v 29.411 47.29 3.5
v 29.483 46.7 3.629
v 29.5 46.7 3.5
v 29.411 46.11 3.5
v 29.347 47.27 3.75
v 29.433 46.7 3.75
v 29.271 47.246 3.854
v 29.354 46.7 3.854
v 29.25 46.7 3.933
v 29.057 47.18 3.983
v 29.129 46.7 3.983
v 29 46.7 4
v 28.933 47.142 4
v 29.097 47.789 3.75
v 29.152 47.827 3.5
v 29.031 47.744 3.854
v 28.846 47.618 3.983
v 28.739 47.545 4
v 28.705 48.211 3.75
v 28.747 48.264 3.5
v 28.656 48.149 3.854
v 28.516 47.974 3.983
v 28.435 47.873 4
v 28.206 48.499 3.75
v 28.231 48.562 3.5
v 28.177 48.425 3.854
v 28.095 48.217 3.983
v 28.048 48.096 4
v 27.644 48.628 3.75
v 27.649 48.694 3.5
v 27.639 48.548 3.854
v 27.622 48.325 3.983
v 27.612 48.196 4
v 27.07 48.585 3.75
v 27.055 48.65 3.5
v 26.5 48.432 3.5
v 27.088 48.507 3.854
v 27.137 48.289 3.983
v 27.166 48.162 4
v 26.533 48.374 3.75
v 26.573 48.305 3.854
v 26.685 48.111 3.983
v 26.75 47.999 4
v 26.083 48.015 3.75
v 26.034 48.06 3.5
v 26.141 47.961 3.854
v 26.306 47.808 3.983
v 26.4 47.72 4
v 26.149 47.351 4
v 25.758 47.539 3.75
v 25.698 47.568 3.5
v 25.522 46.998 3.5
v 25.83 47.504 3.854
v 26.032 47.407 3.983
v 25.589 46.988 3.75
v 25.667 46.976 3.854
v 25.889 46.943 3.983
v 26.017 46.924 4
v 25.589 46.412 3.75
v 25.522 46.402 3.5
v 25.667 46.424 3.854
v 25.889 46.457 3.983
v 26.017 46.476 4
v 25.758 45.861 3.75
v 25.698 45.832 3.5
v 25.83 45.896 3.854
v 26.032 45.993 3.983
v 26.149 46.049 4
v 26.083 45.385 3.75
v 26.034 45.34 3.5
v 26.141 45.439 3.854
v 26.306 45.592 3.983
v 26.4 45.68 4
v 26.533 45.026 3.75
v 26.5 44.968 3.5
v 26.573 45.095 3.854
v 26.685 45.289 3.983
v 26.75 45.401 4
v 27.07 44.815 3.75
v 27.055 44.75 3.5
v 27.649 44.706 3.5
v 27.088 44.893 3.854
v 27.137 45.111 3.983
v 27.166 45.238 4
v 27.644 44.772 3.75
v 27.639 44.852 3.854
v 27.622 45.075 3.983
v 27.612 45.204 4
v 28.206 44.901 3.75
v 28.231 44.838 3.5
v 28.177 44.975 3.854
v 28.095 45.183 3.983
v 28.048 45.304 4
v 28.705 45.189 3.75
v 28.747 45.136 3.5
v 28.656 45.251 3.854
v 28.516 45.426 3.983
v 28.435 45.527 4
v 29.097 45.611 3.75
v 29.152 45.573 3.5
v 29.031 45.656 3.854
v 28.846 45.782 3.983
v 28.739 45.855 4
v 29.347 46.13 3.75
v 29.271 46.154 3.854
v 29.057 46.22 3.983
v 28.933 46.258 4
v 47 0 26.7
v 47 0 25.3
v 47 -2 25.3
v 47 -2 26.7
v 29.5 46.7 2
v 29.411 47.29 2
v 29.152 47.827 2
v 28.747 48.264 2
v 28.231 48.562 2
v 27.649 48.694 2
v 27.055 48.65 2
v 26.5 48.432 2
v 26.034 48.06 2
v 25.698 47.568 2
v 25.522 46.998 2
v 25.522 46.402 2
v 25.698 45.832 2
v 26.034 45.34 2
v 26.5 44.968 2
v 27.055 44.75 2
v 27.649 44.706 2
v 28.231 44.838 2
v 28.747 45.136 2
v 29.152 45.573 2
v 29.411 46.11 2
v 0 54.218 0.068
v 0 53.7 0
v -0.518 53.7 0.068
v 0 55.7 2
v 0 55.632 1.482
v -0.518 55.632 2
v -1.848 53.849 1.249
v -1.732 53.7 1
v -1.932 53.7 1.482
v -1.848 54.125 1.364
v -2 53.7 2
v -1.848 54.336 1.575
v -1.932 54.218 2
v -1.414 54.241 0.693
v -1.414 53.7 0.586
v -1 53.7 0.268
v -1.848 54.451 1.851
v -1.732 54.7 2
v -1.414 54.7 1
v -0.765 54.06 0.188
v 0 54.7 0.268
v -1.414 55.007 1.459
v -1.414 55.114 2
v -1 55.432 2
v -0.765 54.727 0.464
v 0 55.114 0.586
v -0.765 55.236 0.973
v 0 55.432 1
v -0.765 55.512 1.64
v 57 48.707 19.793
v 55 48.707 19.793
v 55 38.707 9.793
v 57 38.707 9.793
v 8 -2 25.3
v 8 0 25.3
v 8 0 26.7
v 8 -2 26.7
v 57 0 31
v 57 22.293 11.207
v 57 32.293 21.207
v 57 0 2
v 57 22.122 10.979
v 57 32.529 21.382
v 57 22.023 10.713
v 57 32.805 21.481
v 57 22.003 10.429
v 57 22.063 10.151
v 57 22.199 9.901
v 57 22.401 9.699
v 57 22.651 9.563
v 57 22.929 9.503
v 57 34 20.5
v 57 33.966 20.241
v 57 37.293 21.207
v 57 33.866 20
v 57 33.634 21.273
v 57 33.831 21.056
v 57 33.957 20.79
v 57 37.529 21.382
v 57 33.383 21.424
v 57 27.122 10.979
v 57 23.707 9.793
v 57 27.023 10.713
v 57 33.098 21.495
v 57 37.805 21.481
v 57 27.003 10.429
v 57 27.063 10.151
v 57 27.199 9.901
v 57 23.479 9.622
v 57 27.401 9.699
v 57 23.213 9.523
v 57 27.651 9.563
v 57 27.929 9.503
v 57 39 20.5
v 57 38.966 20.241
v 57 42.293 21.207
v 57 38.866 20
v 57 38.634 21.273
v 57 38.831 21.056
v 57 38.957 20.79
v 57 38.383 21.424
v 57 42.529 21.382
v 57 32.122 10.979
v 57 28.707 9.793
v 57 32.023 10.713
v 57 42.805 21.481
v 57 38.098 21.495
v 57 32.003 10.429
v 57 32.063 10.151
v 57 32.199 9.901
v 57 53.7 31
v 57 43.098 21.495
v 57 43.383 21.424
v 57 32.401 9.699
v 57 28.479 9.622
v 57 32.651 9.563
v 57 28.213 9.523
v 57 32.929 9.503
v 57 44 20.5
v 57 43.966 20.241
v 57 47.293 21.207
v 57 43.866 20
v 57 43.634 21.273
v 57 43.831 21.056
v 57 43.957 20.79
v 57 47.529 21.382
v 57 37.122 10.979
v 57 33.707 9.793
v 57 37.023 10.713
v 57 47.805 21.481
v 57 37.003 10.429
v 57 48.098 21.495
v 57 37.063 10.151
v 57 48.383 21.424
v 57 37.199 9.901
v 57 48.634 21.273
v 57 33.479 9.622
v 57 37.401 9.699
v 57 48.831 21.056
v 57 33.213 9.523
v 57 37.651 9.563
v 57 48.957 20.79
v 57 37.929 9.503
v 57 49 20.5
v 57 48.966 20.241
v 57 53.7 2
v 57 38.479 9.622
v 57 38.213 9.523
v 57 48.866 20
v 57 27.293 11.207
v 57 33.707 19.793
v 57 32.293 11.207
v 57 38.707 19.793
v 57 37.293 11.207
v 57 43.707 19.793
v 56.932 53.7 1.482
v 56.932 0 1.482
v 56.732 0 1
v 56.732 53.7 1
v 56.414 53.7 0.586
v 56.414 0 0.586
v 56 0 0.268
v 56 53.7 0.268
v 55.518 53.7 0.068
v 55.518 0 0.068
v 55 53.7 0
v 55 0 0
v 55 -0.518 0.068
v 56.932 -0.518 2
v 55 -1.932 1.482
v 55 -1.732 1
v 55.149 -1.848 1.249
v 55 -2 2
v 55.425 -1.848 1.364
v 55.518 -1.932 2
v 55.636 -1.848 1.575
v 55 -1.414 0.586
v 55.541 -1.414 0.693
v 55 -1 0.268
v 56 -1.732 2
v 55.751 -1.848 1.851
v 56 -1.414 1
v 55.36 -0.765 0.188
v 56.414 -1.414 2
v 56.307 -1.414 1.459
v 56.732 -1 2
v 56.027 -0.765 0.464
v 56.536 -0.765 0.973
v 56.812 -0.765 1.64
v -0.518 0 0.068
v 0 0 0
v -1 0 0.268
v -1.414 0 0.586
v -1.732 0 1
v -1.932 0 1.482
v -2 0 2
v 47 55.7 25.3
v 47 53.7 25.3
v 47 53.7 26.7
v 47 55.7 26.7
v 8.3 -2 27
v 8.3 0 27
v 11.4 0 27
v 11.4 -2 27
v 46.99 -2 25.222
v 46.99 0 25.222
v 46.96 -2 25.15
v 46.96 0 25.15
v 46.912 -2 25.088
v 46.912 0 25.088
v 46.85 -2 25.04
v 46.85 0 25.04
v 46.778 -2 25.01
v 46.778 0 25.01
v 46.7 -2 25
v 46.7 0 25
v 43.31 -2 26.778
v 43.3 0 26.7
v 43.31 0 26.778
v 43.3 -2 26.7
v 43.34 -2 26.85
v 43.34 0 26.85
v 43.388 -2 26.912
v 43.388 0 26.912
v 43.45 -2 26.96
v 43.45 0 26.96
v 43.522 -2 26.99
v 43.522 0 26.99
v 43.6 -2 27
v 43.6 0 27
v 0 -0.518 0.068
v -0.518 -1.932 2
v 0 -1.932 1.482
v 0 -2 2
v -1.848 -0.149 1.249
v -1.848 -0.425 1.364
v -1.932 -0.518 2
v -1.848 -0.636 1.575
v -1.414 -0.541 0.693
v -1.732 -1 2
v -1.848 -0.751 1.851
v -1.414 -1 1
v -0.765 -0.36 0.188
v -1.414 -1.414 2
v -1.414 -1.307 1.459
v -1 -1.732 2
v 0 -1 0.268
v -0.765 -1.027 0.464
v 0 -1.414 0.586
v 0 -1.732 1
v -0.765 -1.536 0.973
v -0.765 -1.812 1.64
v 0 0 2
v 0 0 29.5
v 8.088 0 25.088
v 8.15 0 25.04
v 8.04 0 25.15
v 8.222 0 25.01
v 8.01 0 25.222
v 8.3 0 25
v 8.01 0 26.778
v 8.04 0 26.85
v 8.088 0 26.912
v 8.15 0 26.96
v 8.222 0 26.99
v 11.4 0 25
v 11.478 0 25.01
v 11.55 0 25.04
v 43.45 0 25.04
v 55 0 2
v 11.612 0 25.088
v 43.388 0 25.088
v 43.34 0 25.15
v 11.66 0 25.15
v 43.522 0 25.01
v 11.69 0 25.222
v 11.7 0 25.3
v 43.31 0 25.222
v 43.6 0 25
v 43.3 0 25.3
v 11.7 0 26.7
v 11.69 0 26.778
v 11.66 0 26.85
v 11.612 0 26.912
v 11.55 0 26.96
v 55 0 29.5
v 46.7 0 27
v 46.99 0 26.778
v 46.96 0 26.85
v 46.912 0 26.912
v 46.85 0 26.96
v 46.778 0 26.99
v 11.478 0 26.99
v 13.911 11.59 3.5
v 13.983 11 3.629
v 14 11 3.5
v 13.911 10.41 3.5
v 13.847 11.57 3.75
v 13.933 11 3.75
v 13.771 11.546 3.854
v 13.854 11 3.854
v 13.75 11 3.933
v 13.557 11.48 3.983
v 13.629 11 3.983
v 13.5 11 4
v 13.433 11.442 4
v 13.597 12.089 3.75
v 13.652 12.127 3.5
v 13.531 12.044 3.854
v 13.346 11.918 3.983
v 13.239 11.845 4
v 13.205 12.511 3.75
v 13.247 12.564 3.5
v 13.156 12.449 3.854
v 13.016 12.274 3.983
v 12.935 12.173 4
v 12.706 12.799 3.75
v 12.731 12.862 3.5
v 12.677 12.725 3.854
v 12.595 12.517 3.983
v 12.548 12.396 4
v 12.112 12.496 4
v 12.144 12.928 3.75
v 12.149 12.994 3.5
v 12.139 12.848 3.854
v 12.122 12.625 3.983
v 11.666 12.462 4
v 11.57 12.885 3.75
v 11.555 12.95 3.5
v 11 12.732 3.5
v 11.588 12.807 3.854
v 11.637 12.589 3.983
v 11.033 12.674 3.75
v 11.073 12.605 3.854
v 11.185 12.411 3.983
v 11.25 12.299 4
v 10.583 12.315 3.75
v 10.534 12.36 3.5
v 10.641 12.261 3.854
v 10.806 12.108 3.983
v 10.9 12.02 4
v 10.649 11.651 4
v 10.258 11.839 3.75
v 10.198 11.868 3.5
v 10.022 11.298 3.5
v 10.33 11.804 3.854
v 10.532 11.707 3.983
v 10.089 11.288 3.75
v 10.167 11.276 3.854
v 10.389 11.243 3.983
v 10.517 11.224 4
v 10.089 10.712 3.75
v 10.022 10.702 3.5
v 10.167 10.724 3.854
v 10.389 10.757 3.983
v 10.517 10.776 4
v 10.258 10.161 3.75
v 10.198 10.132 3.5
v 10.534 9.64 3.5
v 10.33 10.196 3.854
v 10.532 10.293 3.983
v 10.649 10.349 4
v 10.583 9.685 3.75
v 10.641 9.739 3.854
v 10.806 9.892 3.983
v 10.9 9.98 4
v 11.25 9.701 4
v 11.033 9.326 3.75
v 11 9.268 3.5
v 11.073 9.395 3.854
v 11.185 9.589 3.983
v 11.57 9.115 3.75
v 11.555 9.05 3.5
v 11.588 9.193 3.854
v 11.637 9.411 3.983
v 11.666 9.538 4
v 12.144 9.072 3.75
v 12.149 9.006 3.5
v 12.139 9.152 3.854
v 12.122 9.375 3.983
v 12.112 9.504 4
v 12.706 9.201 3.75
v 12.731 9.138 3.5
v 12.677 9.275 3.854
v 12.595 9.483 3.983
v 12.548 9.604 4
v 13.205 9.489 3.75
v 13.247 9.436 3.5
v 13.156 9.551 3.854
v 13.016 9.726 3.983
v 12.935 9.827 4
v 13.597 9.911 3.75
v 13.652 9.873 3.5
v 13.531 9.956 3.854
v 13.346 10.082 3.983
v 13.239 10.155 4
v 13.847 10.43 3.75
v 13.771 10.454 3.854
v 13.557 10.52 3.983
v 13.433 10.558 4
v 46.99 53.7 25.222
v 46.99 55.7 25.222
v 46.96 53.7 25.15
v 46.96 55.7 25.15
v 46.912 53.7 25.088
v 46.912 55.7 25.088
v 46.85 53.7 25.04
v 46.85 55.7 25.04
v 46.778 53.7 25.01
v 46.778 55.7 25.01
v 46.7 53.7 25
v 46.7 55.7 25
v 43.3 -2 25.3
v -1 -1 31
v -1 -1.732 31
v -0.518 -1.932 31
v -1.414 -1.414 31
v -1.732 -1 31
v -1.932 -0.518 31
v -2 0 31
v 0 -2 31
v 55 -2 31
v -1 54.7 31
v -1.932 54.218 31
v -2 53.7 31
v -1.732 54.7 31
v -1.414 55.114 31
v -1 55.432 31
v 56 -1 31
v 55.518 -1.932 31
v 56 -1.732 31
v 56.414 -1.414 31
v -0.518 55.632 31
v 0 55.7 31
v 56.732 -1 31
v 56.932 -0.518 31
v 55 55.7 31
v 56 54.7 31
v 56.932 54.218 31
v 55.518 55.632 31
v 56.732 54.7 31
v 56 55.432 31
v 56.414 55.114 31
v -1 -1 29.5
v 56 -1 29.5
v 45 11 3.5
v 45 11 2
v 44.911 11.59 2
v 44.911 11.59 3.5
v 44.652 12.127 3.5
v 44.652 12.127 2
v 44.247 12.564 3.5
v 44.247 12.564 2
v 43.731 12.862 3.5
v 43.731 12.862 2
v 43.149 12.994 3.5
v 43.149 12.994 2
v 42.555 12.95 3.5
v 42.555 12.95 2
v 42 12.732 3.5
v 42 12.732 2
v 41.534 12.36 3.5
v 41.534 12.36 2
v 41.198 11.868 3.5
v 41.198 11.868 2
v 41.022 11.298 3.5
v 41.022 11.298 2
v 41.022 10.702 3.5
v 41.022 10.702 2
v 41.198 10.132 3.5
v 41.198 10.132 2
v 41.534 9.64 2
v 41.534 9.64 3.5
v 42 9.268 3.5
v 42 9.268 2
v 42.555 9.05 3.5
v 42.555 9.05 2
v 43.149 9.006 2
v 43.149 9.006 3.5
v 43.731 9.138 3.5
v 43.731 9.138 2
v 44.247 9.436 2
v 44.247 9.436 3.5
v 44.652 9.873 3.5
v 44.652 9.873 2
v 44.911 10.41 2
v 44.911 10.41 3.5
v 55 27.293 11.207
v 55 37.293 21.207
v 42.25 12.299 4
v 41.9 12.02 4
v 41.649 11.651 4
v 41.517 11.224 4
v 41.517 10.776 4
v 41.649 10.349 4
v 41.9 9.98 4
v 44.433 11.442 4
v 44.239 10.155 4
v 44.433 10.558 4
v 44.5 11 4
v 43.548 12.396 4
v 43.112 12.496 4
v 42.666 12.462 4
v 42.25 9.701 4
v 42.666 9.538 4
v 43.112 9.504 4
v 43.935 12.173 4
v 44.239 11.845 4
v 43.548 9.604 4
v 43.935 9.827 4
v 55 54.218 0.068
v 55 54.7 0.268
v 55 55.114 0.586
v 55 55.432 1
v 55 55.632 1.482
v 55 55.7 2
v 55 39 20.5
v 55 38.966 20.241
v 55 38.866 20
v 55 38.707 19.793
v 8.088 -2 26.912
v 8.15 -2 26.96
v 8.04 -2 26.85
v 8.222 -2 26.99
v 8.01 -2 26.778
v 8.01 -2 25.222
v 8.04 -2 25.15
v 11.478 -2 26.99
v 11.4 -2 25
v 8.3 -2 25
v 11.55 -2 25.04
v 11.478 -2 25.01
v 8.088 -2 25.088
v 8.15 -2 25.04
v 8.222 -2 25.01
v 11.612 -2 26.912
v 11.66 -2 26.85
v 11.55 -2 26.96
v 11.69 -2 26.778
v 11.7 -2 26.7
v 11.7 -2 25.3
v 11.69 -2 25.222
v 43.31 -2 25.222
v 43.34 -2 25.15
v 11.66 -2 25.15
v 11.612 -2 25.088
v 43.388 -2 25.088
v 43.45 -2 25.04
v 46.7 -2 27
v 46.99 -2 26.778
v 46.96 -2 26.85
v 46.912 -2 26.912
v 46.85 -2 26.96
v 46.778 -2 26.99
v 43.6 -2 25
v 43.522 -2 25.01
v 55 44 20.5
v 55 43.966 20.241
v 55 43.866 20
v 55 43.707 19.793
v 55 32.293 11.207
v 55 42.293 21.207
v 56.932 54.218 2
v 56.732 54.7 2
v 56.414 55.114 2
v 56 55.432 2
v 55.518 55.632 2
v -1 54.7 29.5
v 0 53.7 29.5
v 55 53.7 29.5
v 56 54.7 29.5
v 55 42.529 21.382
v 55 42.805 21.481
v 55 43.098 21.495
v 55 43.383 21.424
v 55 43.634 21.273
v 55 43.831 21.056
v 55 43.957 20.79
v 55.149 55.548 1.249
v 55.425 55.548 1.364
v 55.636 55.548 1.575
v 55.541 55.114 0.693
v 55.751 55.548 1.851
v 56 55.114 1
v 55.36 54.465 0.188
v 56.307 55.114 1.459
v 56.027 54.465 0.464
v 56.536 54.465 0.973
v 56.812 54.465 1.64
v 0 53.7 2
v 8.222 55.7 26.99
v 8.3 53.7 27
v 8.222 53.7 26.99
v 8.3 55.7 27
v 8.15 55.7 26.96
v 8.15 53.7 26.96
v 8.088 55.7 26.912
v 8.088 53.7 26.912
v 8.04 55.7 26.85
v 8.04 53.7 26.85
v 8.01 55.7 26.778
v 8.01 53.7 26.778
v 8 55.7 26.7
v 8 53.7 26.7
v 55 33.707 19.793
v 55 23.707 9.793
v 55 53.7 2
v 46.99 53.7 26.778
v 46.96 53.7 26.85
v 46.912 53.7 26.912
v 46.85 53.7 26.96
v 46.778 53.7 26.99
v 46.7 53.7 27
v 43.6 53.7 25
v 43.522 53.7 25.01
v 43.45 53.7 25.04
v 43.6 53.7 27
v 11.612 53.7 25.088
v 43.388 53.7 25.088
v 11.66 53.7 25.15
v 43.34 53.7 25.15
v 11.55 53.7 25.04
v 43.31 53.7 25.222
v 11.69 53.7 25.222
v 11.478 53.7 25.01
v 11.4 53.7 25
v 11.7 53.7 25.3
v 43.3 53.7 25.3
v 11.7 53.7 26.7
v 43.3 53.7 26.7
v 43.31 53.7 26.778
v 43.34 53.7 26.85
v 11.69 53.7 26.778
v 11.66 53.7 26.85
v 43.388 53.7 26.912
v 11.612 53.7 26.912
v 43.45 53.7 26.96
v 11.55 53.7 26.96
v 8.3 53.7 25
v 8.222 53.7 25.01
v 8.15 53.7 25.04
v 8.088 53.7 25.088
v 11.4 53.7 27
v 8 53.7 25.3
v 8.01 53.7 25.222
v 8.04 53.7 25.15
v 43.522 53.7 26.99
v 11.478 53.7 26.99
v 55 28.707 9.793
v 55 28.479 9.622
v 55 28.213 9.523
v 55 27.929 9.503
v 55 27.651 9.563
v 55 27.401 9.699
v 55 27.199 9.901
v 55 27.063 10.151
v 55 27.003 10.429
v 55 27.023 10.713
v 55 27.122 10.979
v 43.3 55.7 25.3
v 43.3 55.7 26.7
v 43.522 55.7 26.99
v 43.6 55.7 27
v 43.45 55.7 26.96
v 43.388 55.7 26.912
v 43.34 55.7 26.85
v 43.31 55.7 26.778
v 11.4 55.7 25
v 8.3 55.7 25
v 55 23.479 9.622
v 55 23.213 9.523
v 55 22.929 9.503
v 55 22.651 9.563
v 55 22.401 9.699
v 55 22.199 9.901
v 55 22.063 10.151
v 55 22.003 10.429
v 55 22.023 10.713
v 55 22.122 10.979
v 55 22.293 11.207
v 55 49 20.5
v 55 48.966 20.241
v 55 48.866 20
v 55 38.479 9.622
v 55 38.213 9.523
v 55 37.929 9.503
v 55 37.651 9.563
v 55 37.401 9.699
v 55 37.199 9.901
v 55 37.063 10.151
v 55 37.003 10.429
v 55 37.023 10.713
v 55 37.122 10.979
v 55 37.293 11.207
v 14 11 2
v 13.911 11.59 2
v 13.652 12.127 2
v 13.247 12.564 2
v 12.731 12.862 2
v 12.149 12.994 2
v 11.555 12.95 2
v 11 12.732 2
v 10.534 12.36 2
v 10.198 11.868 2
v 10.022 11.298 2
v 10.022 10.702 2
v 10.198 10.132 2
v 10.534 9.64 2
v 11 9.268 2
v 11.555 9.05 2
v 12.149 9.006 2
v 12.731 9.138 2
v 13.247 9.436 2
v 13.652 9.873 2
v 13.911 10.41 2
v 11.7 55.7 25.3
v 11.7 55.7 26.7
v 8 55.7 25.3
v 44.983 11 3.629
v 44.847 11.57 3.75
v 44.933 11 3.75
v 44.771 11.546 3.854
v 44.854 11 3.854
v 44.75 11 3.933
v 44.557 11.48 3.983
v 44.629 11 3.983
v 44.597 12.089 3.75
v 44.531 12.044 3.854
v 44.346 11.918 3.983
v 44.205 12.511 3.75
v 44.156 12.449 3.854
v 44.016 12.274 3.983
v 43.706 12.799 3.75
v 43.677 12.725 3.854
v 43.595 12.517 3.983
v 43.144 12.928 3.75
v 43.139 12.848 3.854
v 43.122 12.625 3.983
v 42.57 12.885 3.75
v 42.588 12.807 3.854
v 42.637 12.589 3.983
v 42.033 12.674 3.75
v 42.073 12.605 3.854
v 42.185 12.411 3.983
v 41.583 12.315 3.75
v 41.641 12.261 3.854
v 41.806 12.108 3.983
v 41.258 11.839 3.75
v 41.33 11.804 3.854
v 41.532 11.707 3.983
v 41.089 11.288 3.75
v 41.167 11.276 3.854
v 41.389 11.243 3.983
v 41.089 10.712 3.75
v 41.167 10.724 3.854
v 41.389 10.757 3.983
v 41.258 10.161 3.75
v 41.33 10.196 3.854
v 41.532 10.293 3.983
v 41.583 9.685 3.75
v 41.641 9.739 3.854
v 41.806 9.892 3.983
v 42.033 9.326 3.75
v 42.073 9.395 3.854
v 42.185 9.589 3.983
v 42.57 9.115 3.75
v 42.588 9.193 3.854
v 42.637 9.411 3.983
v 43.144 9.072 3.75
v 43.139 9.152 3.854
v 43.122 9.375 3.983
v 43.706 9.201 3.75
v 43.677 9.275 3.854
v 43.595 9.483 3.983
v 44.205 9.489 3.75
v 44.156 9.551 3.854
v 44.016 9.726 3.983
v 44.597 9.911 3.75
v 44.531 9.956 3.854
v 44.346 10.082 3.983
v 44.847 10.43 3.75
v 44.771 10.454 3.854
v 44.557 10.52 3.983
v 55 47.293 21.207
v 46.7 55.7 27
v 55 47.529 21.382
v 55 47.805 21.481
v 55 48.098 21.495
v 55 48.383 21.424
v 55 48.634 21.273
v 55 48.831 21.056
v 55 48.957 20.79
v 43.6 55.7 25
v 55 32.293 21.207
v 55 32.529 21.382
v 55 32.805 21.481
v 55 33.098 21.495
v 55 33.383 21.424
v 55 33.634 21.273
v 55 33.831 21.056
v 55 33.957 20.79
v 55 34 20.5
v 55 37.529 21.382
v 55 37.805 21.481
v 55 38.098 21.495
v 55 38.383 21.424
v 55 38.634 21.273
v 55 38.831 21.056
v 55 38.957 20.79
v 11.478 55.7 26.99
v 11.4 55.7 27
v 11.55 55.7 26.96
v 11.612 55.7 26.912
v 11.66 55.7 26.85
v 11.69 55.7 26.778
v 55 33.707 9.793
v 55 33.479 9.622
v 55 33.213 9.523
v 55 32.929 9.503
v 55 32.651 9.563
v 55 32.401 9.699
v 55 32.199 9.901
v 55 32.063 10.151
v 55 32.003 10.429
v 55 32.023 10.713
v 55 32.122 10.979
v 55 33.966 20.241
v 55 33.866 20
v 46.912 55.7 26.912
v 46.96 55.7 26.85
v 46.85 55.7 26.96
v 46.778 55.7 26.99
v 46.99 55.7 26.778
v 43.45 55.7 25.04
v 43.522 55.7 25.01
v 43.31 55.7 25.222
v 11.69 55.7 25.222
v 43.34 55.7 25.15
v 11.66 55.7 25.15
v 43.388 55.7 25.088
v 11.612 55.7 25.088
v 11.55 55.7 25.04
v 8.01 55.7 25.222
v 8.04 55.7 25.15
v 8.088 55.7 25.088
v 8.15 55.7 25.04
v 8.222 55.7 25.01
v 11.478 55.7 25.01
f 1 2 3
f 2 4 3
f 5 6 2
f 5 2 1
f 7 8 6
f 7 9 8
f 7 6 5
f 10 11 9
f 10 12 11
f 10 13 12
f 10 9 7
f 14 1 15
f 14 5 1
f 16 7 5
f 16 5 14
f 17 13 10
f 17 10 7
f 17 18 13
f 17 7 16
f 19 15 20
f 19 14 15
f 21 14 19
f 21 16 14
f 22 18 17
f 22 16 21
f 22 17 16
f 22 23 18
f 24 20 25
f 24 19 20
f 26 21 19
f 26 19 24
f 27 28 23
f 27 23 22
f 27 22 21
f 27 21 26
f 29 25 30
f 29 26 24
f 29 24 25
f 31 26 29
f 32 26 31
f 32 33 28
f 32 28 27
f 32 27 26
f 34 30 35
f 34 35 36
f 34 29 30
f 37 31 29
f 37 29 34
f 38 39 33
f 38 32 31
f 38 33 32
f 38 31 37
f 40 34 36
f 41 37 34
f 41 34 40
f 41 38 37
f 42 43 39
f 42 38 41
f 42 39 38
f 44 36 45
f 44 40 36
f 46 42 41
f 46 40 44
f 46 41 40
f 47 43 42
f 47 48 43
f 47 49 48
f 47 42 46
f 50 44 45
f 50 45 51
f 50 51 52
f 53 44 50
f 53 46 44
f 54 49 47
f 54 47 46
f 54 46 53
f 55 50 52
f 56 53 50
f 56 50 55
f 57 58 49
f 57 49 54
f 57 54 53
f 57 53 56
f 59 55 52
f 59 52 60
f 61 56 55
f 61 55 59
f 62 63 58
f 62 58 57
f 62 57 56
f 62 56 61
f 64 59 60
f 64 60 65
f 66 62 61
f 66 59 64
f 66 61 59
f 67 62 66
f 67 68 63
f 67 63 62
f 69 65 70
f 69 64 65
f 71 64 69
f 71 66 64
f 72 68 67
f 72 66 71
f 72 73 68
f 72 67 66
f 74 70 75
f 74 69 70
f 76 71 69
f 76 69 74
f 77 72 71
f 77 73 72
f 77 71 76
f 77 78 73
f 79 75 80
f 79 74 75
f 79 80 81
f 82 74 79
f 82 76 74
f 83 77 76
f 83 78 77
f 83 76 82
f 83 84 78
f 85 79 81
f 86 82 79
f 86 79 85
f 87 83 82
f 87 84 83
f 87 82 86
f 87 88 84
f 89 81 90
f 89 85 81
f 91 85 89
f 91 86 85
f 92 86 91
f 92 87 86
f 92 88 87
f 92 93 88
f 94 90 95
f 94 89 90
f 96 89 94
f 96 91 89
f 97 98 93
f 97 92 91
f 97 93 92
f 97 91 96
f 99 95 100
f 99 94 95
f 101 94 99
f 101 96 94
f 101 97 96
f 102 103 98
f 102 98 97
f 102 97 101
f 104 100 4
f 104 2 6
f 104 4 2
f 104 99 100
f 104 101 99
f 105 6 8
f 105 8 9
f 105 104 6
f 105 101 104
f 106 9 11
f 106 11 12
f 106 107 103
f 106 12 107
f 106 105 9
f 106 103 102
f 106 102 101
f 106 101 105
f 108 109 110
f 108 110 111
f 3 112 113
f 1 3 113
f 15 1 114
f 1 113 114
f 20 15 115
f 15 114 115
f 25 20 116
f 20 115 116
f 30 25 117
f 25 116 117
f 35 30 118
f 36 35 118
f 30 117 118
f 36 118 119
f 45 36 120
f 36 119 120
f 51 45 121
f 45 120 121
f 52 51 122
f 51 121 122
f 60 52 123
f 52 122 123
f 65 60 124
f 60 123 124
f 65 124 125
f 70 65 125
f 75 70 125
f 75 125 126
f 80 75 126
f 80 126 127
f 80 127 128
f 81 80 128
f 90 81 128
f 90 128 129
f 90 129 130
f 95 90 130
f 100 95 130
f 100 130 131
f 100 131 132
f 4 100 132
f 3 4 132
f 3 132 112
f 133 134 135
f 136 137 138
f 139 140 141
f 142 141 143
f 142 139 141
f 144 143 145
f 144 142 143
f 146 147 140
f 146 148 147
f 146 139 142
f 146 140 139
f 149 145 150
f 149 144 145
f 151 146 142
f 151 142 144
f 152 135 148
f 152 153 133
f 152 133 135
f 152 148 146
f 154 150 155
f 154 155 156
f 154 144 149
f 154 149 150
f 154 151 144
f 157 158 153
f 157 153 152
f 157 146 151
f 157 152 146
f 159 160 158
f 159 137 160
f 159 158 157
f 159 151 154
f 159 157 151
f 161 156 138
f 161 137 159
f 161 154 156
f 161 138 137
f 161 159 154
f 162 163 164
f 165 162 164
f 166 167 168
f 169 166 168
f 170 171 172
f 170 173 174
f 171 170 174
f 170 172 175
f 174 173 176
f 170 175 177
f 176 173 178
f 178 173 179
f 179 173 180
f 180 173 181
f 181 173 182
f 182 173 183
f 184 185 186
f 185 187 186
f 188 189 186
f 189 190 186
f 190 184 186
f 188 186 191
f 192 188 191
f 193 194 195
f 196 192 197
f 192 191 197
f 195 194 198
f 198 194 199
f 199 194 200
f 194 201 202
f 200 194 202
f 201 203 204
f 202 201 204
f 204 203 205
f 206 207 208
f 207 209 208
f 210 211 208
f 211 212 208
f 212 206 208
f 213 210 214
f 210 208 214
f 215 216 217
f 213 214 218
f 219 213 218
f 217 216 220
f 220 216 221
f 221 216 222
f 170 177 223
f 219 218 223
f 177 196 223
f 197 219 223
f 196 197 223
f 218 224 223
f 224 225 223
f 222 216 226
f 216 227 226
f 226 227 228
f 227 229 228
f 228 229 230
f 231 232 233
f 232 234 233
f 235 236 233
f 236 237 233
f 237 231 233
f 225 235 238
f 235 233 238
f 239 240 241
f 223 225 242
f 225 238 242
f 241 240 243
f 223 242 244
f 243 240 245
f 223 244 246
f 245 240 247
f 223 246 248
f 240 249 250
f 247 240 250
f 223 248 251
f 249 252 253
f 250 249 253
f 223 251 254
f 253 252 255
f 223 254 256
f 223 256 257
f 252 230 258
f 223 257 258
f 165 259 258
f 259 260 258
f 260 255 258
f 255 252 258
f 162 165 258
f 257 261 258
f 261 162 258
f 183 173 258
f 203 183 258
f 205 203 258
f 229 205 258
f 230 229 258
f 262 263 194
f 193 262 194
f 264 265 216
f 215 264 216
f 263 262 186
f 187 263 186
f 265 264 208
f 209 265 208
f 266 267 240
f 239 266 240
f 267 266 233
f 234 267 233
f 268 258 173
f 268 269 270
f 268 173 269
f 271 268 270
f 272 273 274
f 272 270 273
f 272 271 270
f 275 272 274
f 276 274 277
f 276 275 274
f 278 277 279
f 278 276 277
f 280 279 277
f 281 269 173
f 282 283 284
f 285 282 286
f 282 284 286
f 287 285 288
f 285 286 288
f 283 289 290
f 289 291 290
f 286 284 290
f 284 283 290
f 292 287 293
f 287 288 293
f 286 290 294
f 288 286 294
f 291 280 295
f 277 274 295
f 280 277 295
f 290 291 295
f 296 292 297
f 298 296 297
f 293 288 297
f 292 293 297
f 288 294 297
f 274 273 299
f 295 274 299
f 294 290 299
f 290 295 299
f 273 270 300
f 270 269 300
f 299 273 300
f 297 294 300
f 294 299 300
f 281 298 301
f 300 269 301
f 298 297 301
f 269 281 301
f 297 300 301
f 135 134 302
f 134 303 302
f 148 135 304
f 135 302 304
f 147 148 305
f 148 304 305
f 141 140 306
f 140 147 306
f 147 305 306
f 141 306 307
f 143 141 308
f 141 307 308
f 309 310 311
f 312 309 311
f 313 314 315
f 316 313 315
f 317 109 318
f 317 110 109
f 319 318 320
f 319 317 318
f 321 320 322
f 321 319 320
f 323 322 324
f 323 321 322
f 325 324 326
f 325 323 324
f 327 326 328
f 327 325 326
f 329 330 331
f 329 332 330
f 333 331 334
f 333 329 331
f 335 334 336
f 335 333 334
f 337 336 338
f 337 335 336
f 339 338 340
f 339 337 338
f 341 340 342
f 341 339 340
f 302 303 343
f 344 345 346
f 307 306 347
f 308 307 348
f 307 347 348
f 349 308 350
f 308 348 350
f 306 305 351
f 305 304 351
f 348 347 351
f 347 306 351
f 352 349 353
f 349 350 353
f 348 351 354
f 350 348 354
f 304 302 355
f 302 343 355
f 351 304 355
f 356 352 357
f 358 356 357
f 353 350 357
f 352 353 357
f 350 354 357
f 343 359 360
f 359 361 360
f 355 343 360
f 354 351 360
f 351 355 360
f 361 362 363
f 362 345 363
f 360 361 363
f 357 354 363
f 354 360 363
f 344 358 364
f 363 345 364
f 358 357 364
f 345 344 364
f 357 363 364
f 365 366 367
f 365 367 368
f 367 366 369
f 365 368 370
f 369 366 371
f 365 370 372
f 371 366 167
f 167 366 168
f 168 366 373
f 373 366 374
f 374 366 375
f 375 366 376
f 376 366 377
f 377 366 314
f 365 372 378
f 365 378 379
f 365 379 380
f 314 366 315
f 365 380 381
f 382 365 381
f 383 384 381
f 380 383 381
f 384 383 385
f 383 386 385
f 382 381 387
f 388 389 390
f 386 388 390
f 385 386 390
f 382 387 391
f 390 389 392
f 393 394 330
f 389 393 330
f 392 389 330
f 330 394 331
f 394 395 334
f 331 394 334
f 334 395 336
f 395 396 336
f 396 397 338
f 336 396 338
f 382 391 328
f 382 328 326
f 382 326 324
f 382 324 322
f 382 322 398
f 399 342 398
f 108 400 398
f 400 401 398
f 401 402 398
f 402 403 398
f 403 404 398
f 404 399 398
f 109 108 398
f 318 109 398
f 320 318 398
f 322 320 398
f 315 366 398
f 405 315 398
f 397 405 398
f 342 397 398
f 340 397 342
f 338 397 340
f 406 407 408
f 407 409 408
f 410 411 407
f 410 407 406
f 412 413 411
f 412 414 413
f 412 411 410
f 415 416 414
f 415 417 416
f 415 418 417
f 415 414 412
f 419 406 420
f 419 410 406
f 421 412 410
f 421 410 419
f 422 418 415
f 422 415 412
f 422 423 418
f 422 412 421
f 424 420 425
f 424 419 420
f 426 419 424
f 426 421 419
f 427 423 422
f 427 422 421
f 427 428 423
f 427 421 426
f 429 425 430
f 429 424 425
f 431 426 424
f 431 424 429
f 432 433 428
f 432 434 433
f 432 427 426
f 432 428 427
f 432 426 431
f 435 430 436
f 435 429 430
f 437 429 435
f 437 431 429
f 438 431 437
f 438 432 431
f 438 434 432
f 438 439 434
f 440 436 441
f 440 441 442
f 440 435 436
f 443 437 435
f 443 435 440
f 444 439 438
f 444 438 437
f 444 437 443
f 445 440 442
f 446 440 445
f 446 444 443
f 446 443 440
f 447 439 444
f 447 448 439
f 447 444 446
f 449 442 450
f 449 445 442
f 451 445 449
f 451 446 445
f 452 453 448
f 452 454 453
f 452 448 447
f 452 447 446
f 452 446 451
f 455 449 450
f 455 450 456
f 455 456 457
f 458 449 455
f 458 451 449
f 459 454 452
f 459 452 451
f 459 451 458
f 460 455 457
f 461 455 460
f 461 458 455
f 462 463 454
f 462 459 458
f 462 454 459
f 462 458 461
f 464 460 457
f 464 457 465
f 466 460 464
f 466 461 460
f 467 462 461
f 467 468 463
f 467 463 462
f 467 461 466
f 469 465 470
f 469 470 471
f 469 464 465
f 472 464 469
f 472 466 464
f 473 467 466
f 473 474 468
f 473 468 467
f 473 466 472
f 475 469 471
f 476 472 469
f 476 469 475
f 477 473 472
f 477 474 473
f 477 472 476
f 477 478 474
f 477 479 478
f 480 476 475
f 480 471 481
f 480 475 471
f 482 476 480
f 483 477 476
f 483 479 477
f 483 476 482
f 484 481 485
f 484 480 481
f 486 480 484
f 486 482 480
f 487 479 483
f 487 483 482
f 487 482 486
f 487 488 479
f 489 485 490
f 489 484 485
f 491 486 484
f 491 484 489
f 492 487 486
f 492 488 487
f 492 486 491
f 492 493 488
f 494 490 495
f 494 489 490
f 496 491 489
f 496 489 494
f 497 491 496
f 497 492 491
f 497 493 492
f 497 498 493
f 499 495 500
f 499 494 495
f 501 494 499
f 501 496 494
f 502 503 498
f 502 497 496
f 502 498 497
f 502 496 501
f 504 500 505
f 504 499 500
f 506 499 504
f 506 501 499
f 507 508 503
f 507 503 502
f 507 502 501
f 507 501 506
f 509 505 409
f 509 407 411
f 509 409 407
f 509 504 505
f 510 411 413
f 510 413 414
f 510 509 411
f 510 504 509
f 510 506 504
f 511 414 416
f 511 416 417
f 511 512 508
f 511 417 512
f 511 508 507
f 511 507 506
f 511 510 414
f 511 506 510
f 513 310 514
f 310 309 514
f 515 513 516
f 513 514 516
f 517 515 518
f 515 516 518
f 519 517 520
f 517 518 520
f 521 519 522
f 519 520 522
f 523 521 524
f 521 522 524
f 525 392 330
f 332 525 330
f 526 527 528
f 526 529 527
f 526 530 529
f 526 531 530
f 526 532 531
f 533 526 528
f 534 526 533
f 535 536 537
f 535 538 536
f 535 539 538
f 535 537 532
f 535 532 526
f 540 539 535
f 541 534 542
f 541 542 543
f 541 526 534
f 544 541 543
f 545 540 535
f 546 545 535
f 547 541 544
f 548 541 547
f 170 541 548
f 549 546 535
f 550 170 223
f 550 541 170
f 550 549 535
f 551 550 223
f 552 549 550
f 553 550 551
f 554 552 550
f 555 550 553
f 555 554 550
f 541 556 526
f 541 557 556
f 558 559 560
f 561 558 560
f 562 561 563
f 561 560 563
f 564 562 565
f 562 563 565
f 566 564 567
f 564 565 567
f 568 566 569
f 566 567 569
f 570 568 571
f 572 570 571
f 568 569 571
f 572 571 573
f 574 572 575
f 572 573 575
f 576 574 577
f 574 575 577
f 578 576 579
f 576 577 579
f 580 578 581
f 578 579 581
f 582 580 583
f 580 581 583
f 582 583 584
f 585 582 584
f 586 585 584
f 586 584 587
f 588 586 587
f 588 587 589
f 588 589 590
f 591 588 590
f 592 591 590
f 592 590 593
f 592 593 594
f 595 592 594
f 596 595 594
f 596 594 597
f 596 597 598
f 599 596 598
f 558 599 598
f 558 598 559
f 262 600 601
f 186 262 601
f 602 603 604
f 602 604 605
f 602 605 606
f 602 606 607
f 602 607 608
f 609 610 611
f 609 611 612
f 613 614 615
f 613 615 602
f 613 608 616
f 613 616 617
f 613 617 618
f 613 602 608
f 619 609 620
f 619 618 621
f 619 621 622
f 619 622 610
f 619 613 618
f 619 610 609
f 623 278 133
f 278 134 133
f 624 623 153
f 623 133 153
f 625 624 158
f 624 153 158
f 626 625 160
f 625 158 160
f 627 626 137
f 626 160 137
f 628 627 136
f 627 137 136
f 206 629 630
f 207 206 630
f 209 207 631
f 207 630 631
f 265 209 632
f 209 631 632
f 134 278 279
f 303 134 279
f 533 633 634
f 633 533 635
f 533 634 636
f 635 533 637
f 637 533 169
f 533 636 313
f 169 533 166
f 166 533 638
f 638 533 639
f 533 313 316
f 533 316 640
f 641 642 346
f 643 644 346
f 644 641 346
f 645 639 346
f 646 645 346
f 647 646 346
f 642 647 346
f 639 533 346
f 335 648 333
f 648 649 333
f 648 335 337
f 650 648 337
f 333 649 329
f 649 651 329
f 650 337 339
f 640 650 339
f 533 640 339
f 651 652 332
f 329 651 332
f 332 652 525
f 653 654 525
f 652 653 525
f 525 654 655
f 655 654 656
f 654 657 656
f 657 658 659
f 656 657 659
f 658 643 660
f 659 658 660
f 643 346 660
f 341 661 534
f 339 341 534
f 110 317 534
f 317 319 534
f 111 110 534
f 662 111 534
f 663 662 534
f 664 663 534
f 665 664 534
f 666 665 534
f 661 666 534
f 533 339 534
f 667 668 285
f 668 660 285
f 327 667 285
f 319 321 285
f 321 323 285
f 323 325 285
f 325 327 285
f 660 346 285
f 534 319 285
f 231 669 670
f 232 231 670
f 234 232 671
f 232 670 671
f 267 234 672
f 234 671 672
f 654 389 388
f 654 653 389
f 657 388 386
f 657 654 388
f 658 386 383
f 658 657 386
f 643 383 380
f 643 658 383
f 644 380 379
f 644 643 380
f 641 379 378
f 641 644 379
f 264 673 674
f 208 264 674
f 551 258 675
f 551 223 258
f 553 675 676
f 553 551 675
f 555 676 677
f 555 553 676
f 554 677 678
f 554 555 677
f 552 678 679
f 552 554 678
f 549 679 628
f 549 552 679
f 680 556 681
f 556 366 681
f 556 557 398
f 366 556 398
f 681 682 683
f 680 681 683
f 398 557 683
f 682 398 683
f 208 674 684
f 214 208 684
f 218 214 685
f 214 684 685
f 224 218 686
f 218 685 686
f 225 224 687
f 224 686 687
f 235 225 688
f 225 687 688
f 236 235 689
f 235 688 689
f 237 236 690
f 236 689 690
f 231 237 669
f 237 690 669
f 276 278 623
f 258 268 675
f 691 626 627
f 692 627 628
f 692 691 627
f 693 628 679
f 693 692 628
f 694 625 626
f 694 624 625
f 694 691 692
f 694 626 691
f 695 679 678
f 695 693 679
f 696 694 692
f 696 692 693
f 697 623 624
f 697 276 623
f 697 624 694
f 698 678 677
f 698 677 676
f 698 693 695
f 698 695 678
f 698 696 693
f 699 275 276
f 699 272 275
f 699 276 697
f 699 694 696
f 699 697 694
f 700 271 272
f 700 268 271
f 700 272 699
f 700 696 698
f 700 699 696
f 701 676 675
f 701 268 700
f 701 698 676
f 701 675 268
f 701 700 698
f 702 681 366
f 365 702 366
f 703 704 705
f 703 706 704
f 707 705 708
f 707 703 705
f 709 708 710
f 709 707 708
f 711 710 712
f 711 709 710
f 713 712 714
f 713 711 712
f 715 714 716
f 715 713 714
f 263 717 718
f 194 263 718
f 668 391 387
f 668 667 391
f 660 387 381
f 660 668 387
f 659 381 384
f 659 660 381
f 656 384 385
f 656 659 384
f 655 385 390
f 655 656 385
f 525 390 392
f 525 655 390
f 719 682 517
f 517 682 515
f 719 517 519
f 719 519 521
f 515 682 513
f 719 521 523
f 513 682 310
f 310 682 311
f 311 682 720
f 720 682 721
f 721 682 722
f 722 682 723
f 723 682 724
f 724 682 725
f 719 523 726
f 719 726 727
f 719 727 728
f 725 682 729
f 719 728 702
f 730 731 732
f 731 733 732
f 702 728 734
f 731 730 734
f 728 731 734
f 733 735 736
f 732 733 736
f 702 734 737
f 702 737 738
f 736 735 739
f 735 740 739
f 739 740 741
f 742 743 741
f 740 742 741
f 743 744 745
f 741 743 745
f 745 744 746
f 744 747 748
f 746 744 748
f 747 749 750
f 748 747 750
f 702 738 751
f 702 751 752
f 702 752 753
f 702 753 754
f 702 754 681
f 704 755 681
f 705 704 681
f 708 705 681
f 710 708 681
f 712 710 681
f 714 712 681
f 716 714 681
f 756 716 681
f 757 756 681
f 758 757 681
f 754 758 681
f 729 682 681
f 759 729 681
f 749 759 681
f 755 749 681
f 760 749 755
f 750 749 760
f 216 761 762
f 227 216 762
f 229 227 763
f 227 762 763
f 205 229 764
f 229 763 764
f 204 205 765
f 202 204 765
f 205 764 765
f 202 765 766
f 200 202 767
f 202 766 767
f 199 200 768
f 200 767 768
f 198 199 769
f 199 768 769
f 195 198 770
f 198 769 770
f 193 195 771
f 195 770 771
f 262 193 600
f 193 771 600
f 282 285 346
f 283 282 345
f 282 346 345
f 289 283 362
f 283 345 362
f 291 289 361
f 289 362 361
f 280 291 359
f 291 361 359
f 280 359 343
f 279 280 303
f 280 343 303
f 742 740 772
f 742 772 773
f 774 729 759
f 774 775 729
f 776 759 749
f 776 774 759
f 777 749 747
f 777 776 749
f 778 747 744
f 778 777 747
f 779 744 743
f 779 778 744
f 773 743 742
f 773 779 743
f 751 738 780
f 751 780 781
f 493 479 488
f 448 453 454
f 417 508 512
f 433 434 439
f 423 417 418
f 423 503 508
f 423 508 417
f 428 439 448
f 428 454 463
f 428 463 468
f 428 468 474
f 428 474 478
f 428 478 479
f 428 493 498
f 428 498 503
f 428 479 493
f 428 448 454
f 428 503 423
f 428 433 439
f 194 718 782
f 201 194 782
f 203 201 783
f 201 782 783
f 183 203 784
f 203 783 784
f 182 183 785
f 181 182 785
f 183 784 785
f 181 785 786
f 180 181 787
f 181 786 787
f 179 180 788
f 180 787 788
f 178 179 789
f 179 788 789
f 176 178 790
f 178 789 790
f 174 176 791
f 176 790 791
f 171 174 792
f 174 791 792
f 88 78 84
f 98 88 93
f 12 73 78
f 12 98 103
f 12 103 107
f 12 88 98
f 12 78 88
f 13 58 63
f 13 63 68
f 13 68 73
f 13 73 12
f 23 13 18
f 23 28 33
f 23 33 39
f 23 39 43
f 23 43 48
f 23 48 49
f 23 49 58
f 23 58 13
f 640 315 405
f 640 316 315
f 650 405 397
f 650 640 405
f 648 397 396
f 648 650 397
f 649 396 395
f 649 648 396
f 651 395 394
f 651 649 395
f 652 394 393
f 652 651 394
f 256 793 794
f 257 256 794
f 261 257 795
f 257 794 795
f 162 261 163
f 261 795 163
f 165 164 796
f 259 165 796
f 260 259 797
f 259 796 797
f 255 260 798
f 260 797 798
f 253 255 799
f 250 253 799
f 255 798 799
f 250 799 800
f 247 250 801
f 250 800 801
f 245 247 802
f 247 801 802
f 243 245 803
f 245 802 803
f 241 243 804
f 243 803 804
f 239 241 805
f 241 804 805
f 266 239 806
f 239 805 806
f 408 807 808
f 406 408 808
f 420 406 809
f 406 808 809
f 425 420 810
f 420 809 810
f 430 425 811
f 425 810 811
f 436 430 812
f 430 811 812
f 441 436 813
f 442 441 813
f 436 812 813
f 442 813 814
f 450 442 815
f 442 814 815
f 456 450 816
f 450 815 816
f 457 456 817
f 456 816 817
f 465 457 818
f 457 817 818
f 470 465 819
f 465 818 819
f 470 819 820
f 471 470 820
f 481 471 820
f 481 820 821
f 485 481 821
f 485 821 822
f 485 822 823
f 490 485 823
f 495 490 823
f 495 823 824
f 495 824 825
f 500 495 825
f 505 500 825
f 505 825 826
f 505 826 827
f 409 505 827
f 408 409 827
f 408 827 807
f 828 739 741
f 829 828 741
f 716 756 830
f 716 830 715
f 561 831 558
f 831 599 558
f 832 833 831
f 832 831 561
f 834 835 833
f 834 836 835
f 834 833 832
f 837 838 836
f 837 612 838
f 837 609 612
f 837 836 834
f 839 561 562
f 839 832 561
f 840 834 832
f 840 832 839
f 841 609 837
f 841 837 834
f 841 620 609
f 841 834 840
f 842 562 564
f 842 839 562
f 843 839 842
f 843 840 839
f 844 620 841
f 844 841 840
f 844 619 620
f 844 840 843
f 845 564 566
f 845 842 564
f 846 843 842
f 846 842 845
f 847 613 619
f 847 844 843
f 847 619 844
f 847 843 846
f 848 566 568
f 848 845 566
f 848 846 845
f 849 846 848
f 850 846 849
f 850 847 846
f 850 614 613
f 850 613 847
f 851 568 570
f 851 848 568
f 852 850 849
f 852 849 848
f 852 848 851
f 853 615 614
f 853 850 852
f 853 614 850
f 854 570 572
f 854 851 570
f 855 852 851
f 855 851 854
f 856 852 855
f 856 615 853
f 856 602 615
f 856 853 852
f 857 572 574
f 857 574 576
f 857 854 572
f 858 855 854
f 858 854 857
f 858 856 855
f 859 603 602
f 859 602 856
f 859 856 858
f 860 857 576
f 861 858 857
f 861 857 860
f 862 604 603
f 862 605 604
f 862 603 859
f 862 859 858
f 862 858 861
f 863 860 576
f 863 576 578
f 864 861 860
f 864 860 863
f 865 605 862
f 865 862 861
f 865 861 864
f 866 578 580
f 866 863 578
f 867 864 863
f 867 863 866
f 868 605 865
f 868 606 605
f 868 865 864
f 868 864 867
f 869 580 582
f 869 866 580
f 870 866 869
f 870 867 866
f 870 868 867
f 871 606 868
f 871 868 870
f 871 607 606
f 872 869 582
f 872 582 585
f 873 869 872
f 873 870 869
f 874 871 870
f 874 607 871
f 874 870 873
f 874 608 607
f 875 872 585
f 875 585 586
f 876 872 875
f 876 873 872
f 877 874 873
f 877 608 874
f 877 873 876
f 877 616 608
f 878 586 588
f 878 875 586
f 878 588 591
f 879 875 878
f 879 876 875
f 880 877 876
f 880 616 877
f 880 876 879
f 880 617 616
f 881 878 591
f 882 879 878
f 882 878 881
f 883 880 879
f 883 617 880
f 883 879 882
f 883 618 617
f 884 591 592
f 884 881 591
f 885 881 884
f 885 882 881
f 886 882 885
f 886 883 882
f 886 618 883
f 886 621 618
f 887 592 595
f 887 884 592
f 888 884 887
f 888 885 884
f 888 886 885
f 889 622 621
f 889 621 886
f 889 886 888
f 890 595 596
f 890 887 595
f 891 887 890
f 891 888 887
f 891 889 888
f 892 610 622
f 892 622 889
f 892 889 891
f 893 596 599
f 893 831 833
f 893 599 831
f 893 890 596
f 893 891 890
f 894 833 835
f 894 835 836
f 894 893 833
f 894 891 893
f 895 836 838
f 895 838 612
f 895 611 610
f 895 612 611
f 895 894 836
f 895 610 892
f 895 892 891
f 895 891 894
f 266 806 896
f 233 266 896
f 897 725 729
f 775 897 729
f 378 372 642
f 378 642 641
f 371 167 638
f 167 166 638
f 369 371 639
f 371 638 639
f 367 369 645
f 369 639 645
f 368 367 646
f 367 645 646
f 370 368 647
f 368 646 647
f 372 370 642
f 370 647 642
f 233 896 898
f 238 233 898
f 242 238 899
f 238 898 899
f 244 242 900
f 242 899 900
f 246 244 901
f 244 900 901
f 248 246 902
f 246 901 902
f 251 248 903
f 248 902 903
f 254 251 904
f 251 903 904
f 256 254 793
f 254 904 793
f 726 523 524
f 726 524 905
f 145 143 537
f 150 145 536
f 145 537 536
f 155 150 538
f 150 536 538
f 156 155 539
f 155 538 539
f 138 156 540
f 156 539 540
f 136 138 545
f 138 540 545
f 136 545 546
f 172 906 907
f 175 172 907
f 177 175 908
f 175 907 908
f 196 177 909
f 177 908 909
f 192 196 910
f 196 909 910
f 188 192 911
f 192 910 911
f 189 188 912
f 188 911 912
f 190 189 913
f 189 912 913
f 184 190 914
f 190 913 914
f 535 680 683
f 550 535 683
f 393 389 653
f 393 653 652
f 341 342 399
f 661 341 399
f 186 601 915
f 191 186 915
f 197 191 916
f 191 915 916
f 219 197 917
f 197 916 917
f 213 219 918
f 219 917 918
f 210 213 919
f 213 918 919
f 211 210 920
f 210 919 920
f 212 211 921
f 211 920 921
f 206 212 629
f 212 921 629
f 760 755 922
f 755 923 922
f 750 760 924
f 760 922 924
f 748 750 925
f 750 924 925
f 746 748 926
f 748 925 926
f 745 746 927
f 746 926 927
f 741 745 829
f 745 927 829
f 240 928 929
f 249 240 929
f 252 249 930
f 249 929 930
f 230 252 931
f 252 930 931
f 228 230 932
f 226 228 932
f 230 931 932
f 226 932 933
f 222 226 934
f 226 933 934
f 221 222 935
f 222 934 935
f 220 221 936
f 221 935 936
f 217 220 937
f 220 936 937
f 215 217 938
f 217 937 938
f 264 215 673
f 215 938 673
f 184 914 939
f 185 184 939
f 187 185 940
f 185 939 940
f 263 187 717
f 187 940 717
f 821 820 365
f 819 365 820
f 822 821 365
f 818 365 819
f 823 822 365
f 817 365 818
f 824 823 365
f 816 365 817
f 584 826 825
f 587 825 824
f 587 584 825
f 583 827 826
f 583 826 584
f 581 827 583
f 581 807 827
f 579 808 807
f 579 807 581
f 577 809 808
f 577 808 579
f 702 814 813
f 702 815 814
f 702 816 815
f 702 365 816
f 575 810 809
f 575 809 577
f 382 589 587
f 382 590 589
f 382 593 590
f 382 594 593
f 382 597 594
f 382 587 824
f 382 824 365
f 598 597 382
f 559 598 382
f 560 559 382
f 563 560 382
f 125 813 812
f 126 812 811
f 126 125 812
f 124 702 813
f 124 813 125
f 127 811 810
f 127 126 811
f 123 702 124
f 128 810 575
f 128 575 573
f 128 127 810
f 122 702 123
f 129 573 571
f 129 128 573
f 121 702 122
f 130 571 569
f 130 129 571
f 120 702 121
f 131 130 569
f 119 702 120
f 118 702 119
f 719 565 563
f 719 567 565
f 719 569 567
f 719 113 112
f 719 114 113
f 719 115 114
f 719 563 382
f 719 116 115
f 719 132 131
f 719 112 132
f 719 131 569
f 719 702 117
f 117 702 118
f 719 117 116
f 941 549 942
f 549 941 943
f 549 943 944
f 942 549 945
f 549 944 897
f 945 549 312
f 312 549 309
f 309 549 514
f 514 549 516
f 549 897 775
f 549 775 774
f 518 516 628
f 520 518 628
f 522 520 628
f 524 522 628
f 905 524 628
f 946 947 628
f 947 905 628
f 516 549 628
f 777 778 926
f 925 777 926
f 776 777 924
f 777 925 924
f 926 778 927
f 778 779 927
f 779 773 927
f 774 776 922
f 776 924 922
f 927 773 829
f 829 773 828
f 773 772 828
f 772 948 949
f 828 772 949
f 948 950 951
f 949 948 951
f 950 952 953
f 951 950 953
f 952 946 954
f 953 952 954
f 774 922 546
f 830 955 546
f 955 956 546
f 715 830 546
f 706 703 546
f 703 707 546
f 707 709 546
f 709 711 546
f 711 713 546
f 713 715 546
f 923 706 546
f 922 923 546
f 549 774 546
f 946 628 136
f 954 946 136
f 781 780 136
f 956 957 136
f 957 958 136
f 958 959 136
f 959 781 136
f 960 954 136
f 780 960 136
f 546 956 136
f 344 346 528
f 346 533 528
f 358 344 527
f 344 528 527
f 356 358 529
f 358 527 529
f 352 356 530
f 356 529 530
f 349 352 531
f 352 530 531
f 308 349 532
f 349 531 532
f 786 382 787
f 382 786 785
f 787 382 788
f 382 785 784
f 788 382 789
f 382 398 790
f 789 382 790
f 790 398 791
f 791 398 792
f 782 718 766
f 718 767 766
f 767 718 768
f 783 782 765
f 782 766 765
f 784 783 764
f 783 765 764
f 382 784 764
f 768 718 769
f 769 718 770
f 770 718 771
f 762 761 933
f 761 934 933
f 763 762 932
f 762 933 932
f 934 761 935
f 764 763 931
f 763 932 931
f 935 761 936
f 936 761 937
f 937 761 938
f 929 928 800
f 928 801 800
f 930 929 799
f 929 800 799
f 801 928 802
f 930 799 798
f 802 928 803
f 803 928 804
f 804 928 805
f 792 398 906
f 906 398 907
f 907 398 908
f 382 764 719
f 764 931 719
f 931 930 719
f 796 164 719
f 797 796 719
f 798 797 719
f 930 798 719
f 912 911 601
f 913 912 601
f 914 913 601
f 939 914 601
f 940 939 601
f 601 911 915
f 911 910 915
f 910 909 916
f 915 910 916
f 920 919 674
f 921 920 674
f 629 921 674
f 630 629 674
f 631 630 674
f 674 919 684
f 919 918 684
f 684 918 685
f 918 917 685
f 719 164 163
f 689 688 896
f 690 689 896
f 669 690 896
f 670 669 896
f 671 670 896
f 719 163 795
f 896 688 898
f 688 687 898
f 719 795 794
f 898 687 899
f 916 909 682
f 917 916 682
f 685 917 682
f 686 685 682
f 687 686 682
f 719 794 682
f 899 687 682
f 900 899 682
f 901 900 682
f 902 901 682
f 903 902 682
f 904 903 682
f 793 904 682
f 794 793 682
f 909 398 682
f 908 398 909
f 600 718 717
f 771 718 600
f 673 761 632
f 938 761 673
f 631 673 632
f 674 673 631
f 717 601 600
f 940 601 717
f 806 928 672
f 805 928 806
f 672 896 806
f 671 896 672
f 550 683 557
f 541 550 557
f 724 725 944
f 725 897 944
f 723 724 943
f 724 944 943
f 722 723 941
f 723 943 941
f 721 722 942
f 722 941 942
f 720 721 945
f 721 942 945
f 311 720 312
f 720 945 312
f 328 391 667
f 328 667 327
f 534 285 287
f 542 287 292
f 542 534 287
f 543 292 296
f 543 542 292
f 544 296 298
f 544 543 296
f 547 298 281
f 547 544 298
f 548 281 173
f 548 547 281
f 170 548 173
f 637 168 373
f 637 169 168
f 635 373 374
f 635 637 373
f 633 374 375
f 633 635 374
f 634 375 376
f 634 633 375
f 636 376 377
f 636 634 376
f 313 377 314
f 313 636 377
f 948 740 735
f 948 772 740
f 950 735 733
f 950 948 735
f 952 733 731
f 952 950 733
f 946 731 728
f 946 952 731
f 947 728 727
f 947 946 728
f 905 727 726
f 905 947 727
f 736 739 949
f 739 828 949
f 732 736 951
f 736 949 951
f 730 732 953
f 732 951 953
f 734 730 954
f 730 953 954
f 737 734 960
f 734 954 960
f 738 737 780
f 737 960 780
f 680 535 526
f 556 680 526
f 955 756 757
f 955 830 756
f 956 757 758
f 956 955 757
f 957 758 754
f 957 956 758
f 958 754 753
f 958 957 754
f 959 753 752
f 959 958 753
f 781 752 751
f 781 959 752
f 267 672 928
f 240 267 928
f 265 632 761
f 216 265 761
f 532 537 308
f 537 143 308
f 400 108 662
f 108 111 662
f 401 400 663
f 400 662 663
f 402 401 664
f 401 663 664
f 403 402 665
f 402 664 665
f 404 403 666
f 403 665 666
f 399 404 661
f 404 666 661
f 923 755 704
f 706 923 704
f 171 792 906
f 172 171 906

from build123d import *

# Parameters (mm, degrees)
F0_W      = 55
F0_H      = 53.7
F0_R      = 2
F1_DEPTH  = 2
F2_DEPTH  = 4
F3_W      = 55
F3_H      = 27.5
F3_W_2    = 3.7
F3_H_2    = 2
F4_DEPTH  = 2
F5_START  = 1
F3_H_3    = 1.5
F5_DEPTH  = 1
F6_W      = 53.7
F6_H      = 27.5
F7_DEPTH  = 2
F8_START  = 1
F8_DEPTH  = 1
F10_DEPTH = 1.5
F11_W     = 55
F11_H     = 27.5
F11_W_2   = 3.7
F11_H_2   = 2
F12_DEPTH = 2
F13_START = 1
F13_DEPTH = 1
F15_DEPTH = 1.5
F16_W     = 1
F16_H     = 1.5
F16_W_2   = 53.7
F16_H_2   = 27.5
F17_DEPTH = 2
F18_START = 1
F18_DEPTH = 1
F20_DEPTH = 1.5
F21_W     = 1
F21_H     = 1
F22_DEPTH = 1.5
F23_R     = 0.3
F24_R     = 2
F25_R     = 0.5


with BuildPart() as f1:
    # F0 (on Top) → F1 (new body)
    with BuildSketch(Plane.XY):
        with Locations((27.5, 26.85)):
            Rectangle(F0_W, F0_H)
        with Locations((12, 11)):
            Circle(F0_R, mode=Mode.SUBTRACT)
        with Locations((43, 11)):
            Circle(F0_R, mode=Mode.SUBTRACT)
        with Locations((27.5, 46.7)):
            Circle(F0_R, mode=Mode.SUBTRACT)
    extrude(amount=F1_DEPTH)

    # F0 (on Top) → F2 (join)
    with BuildSketch(Plane.XY):
        with Locations((12, 11)):
            Circle(F0_R)
        with Locations((27.5, 46.7)):
            Circle(F0_R)
        with Locations((43, 11)):
            Circle(F0_R)
    extrude(amount=F2_DEPTH)

    # F3 (on face) → F4 (join)
    with BuildSketch(Plane.XZ):
        with Locations((27.5, 15.75)):
            Rectangle(F3_W, F3_H)
        with Locations((9.85, 26)):
            Rectangle(F3_W_2, F3_H_2, mode=Mode.SUBTRACT)
        with Locations((45.15, 26)):
            Rectangle(F3_W_2, F3_H_2, mode=Mode.SUBTRACT)
        with Locations((27.5, 1)):
            Rectangle(F3_W, F3_H_2)
    extrude(amount=F4_DEPTH)

    # F3 (on face) → F5 (join)
    with BuildSketch(Plane.XZ.offset(F5_START)):
        with Locations((27.5, 30.25)):
            Rectangle(F3_W, F3_H_3)
    extrude(amount=F5_DEPTH)

    # F6 (on face) → F7 (join)
    with BuildSketch(Plane.YZ.offset(55)):
        Polygon((-2, 29.5), (-2, 0), (53.7, 0), (53.7, 2), (0, 2), (0, 29.5), (-1, 29.5), align=None)
        with Locations((26.85, 15.75)):
            Rectangle(F6_W, F6_H)
        with BuildLine():
            ThreePointArc((23.7071067812, 9.7928932188), (22.2928932188, 9.7928932188), (22.2928932188, 11.2071067812))
            Line((22.2928932188, 11.2071067812), (32.2928932188, 21.2071067812))
            ThreePointArc((32.2928932188, 21.2071067812), (33.3826834324, 21.4238795325), (34, 20.5))
            ThreePointArc((34, 20.5), (33.9238795325, 20.1173165676), (33.7071067812, 19.7928932188))
            Line((33.7071067812, 19.7928932188), (23.7071067812, 9.7928932188))
        make_face(mode=Mode.SUBTRACT)
        with BuildLine():
            ThreePointArc((28.7071067812, 9.7928932188), (27.2928932188, 9.7928932188), (27.2928932188, 11.2071067812))
            Line((27.2928932188, 11.2071067812), (37.2928932188, 21.2071067812))
            ThreePointArc((37.2928932188, 21.2071067812), (38.3826834324, 21.4238795325), (39, 20.5))
            ThreePointArc((39, 20.5), (38.9238795325, 20.1173165676), (38.7071067812, 19.7928932188))
            Line((38.7071067812, 19.7928932188), (28.7071067812, 9.7928932188))
        make_face(mode=Mode.SUBTRACT)
        with BuildLine():
            ThreePointArc((33.7071067812, 9.7928932188), (32.2928932188, 9.7928932188), (32.2928932188, 11.2071067812))
            Line((32.2928932188, 11.2071067812), (42.2928932188, 21.2071067812))
            ThreePointArc((42.2928932188, 21.2071067812), (43.3826834324, 21.4238795325), (44, 20.5))
            ThreePointArc((44, 20.5), (43.9238795325, 20.1173165676), (43.7071067812, 19.7928932188))
            Line((43.7071067812, 19.7928932188), (33.7071067812, 9.7928932188))
        make_face(mode=Mode.SUBTRACT)
        with BuildLine():
            ThreePointArc((38.7071067812, 9.7928932188), (37.2928932188, 9.7928932188), (37.2928932188, 11.2071067812))
            Line((37.2928932188, 11.2071067812), (47.2928932188, 21.2071067812))
            ThreePointArc((47.2928932188, 21.2071067812), (48.3826834324, 21.4238795325), (49, 20.5))
            ThreePointArc((49, 20.5), (48.9238795325, 20.1173165676), (48.7071067812, 19.7928932188))
            Line((48.7071067812, 19.7928932188), (38.7071067812, 9.7928932188))
        make_face(mode=Mode.SUBTRACT)
    extrude(amount=F7_DEPTH)

    # F6 (on face) → F8 (join)
    with BuildSketch(Plane.YZ.offset(55).offset(F8_START)):
        Polygon((-1, 31), (-1, 29.5), (0, 29.5), (53.7, 29.5), (53.7, 31), align=None)
    extrude(amount=F8_DEPTH)

    # F9 (on face) → F10 (join)
    with BuildSketch(Plane.XY.offset(29.5)):
        Polygon((56, -1), (55, -1), (55, -2), (57, -2), (57, -1), align=None)
    extrude(amount=F10_DEPTH)

    # F11 (on face) → F12 (join)
    with BuildSketch(Plane(origin=(0, 53.7, 0), x_dir=(-1, 0, 0), z_dir=(0, 1, 0))):
        with Locations((-27.5, 15.75)):
            Rectangle(F11_W, F11_H)
        with Locations((-45.15, 26)):
            Rectangle(F11_W_2, F11_H_2, mode=Mode.SUBTRACT)
        with Locations((-9.85, 26)):
            Rectangle(F11_W_2, F11_H_2, mode=Mode.SUBTRACT)
        Polygon((-57, 29.5), (-57, 0), (0, 0), (0, 2), (-55, 2), (-55, 29.5), (-56, 29.5), align=None)
    extrude(amount=F12_DEPTH)

    # F11 (on face) → F13 (join)
    with BuildSketch(Plane(origin=(0, 53.7, 0), x_dir=(-1, 0, 0), z_dir=(0, 1, 0)).offset(F13_START)):
        Polygon((-56, 31), (-56, 29.5), (-55, 29.5), (0, 29.5), (0, 31), align=None)
    extrude(amount=F13_DEPTH)

    # F14 (on face) → F15 (join)
    with BuildSketch(Plane.XY.offset(29.5)):
        Polygon((56, 54.7), (56, 53.7), (57, 53.7), (57, 55.7), (56, 55.7), align=None)
    extrude(amount=F15_DEPTH)

    # F16 (on face) → F17 (join)
    with BuildSketch(Plane(origin=(0, 0, 0), x_dir=(0, -1, 0), z_dir=(-1, 0, 0))):
        Polygon((-55.7, 29.5), (-55.7, 0), (2, 0), (2, 29.5), (1, 29.5), (0, 29.5), (0, 2), (-53.7, 2), (-53.7, 29.5), (-54.7, 29.5), align=None)
        with Locations((1.5, 30.25)):
            Rectangle(F16_W, F16_H)
        with Locations((-26.85, 15.75)):
            Rectangle(F16_W_2, F16_H_2)
    extrude(amount=F17_DEPTH)

    # F16 (on face) → F18 (join)
    with BuildSketch(Plane(origin=(0, 0, 0), x_dir=(0, -1, 0), z_dir=(-1, 0, 0)).offset(F18_START)):
        Polygon((-54.7, 31), (-54.7, 29.5), (-53.7, 29.5), (0, 29.5), (1, 29.5), (1, 31), align=None)
    extrude(amount=F18_DEPTH)

    # F19 (on face) → F20 (join)
    with BuildSketch(Plane.XY.offset(29.5)):
        Polygon((0, 54.7), (0, 55.7), (-2, 55.7), (-2, 54.7), (-1, 54.7), align=None)
    extrude(amount=F20_DEPTH)

    # F21 (on face) → F22 (join)
    with BuildSketch(Plane.XY.offset(29.5)):
        with Locations((-0.5, -1.5)):
            Rectangle(F21_W, F21_H)
    extrude(amount=F22_DEPTH)

    # F23
    f23_edges = [f1.edges().sort_by_distance(p)[0] for p in [
        (8, -1, 27),
        (11.7, -1, 27),
        (8, -1, 25),
        (11.7, -1, 25),
        (43.3, -1, 25),
        (47, -1, 25),
        (43.3, -1, 27),
        (47, -1, 27),
        (47, 54.7, 27),
        (43.3, 54.7, 25),
        (43.3, 54.7, 27),
        (47, 54.7, 25),
        (11.7, 54.7, 25),
        (8, 54.7, 25),
        (11.7, 54.7, 27),
        (8, 54.7, 27),
    ]]
    fillet(f23_edges, radius=F23_R)

    # F24
    f24_edges = [f1.edges().sort_by_distance(p)[0] for p in [
        (57, 26.85, 0),
        (27.5, 55.7, 0),
        (27.5, -2, 0),
        (-2, 26.85, 0),
        (57, -2, 15.5),
        (57, 55.7, 15.5),
        (-2, 55.7, 15.5),
        (-2, -2, 15.5),
    ]]
    fillet(f24_edges, radius=F24_R)

    # F25
    f25_edges = [f1.edges().sort_by_distance(p)[0] for p in [
        (10, 11, 4),
        (25.5, 46.7, 4),
        (41, 11, 4),
    ]]
    fillet(f25_edges, radius=F25_R)


solid = f1.part
